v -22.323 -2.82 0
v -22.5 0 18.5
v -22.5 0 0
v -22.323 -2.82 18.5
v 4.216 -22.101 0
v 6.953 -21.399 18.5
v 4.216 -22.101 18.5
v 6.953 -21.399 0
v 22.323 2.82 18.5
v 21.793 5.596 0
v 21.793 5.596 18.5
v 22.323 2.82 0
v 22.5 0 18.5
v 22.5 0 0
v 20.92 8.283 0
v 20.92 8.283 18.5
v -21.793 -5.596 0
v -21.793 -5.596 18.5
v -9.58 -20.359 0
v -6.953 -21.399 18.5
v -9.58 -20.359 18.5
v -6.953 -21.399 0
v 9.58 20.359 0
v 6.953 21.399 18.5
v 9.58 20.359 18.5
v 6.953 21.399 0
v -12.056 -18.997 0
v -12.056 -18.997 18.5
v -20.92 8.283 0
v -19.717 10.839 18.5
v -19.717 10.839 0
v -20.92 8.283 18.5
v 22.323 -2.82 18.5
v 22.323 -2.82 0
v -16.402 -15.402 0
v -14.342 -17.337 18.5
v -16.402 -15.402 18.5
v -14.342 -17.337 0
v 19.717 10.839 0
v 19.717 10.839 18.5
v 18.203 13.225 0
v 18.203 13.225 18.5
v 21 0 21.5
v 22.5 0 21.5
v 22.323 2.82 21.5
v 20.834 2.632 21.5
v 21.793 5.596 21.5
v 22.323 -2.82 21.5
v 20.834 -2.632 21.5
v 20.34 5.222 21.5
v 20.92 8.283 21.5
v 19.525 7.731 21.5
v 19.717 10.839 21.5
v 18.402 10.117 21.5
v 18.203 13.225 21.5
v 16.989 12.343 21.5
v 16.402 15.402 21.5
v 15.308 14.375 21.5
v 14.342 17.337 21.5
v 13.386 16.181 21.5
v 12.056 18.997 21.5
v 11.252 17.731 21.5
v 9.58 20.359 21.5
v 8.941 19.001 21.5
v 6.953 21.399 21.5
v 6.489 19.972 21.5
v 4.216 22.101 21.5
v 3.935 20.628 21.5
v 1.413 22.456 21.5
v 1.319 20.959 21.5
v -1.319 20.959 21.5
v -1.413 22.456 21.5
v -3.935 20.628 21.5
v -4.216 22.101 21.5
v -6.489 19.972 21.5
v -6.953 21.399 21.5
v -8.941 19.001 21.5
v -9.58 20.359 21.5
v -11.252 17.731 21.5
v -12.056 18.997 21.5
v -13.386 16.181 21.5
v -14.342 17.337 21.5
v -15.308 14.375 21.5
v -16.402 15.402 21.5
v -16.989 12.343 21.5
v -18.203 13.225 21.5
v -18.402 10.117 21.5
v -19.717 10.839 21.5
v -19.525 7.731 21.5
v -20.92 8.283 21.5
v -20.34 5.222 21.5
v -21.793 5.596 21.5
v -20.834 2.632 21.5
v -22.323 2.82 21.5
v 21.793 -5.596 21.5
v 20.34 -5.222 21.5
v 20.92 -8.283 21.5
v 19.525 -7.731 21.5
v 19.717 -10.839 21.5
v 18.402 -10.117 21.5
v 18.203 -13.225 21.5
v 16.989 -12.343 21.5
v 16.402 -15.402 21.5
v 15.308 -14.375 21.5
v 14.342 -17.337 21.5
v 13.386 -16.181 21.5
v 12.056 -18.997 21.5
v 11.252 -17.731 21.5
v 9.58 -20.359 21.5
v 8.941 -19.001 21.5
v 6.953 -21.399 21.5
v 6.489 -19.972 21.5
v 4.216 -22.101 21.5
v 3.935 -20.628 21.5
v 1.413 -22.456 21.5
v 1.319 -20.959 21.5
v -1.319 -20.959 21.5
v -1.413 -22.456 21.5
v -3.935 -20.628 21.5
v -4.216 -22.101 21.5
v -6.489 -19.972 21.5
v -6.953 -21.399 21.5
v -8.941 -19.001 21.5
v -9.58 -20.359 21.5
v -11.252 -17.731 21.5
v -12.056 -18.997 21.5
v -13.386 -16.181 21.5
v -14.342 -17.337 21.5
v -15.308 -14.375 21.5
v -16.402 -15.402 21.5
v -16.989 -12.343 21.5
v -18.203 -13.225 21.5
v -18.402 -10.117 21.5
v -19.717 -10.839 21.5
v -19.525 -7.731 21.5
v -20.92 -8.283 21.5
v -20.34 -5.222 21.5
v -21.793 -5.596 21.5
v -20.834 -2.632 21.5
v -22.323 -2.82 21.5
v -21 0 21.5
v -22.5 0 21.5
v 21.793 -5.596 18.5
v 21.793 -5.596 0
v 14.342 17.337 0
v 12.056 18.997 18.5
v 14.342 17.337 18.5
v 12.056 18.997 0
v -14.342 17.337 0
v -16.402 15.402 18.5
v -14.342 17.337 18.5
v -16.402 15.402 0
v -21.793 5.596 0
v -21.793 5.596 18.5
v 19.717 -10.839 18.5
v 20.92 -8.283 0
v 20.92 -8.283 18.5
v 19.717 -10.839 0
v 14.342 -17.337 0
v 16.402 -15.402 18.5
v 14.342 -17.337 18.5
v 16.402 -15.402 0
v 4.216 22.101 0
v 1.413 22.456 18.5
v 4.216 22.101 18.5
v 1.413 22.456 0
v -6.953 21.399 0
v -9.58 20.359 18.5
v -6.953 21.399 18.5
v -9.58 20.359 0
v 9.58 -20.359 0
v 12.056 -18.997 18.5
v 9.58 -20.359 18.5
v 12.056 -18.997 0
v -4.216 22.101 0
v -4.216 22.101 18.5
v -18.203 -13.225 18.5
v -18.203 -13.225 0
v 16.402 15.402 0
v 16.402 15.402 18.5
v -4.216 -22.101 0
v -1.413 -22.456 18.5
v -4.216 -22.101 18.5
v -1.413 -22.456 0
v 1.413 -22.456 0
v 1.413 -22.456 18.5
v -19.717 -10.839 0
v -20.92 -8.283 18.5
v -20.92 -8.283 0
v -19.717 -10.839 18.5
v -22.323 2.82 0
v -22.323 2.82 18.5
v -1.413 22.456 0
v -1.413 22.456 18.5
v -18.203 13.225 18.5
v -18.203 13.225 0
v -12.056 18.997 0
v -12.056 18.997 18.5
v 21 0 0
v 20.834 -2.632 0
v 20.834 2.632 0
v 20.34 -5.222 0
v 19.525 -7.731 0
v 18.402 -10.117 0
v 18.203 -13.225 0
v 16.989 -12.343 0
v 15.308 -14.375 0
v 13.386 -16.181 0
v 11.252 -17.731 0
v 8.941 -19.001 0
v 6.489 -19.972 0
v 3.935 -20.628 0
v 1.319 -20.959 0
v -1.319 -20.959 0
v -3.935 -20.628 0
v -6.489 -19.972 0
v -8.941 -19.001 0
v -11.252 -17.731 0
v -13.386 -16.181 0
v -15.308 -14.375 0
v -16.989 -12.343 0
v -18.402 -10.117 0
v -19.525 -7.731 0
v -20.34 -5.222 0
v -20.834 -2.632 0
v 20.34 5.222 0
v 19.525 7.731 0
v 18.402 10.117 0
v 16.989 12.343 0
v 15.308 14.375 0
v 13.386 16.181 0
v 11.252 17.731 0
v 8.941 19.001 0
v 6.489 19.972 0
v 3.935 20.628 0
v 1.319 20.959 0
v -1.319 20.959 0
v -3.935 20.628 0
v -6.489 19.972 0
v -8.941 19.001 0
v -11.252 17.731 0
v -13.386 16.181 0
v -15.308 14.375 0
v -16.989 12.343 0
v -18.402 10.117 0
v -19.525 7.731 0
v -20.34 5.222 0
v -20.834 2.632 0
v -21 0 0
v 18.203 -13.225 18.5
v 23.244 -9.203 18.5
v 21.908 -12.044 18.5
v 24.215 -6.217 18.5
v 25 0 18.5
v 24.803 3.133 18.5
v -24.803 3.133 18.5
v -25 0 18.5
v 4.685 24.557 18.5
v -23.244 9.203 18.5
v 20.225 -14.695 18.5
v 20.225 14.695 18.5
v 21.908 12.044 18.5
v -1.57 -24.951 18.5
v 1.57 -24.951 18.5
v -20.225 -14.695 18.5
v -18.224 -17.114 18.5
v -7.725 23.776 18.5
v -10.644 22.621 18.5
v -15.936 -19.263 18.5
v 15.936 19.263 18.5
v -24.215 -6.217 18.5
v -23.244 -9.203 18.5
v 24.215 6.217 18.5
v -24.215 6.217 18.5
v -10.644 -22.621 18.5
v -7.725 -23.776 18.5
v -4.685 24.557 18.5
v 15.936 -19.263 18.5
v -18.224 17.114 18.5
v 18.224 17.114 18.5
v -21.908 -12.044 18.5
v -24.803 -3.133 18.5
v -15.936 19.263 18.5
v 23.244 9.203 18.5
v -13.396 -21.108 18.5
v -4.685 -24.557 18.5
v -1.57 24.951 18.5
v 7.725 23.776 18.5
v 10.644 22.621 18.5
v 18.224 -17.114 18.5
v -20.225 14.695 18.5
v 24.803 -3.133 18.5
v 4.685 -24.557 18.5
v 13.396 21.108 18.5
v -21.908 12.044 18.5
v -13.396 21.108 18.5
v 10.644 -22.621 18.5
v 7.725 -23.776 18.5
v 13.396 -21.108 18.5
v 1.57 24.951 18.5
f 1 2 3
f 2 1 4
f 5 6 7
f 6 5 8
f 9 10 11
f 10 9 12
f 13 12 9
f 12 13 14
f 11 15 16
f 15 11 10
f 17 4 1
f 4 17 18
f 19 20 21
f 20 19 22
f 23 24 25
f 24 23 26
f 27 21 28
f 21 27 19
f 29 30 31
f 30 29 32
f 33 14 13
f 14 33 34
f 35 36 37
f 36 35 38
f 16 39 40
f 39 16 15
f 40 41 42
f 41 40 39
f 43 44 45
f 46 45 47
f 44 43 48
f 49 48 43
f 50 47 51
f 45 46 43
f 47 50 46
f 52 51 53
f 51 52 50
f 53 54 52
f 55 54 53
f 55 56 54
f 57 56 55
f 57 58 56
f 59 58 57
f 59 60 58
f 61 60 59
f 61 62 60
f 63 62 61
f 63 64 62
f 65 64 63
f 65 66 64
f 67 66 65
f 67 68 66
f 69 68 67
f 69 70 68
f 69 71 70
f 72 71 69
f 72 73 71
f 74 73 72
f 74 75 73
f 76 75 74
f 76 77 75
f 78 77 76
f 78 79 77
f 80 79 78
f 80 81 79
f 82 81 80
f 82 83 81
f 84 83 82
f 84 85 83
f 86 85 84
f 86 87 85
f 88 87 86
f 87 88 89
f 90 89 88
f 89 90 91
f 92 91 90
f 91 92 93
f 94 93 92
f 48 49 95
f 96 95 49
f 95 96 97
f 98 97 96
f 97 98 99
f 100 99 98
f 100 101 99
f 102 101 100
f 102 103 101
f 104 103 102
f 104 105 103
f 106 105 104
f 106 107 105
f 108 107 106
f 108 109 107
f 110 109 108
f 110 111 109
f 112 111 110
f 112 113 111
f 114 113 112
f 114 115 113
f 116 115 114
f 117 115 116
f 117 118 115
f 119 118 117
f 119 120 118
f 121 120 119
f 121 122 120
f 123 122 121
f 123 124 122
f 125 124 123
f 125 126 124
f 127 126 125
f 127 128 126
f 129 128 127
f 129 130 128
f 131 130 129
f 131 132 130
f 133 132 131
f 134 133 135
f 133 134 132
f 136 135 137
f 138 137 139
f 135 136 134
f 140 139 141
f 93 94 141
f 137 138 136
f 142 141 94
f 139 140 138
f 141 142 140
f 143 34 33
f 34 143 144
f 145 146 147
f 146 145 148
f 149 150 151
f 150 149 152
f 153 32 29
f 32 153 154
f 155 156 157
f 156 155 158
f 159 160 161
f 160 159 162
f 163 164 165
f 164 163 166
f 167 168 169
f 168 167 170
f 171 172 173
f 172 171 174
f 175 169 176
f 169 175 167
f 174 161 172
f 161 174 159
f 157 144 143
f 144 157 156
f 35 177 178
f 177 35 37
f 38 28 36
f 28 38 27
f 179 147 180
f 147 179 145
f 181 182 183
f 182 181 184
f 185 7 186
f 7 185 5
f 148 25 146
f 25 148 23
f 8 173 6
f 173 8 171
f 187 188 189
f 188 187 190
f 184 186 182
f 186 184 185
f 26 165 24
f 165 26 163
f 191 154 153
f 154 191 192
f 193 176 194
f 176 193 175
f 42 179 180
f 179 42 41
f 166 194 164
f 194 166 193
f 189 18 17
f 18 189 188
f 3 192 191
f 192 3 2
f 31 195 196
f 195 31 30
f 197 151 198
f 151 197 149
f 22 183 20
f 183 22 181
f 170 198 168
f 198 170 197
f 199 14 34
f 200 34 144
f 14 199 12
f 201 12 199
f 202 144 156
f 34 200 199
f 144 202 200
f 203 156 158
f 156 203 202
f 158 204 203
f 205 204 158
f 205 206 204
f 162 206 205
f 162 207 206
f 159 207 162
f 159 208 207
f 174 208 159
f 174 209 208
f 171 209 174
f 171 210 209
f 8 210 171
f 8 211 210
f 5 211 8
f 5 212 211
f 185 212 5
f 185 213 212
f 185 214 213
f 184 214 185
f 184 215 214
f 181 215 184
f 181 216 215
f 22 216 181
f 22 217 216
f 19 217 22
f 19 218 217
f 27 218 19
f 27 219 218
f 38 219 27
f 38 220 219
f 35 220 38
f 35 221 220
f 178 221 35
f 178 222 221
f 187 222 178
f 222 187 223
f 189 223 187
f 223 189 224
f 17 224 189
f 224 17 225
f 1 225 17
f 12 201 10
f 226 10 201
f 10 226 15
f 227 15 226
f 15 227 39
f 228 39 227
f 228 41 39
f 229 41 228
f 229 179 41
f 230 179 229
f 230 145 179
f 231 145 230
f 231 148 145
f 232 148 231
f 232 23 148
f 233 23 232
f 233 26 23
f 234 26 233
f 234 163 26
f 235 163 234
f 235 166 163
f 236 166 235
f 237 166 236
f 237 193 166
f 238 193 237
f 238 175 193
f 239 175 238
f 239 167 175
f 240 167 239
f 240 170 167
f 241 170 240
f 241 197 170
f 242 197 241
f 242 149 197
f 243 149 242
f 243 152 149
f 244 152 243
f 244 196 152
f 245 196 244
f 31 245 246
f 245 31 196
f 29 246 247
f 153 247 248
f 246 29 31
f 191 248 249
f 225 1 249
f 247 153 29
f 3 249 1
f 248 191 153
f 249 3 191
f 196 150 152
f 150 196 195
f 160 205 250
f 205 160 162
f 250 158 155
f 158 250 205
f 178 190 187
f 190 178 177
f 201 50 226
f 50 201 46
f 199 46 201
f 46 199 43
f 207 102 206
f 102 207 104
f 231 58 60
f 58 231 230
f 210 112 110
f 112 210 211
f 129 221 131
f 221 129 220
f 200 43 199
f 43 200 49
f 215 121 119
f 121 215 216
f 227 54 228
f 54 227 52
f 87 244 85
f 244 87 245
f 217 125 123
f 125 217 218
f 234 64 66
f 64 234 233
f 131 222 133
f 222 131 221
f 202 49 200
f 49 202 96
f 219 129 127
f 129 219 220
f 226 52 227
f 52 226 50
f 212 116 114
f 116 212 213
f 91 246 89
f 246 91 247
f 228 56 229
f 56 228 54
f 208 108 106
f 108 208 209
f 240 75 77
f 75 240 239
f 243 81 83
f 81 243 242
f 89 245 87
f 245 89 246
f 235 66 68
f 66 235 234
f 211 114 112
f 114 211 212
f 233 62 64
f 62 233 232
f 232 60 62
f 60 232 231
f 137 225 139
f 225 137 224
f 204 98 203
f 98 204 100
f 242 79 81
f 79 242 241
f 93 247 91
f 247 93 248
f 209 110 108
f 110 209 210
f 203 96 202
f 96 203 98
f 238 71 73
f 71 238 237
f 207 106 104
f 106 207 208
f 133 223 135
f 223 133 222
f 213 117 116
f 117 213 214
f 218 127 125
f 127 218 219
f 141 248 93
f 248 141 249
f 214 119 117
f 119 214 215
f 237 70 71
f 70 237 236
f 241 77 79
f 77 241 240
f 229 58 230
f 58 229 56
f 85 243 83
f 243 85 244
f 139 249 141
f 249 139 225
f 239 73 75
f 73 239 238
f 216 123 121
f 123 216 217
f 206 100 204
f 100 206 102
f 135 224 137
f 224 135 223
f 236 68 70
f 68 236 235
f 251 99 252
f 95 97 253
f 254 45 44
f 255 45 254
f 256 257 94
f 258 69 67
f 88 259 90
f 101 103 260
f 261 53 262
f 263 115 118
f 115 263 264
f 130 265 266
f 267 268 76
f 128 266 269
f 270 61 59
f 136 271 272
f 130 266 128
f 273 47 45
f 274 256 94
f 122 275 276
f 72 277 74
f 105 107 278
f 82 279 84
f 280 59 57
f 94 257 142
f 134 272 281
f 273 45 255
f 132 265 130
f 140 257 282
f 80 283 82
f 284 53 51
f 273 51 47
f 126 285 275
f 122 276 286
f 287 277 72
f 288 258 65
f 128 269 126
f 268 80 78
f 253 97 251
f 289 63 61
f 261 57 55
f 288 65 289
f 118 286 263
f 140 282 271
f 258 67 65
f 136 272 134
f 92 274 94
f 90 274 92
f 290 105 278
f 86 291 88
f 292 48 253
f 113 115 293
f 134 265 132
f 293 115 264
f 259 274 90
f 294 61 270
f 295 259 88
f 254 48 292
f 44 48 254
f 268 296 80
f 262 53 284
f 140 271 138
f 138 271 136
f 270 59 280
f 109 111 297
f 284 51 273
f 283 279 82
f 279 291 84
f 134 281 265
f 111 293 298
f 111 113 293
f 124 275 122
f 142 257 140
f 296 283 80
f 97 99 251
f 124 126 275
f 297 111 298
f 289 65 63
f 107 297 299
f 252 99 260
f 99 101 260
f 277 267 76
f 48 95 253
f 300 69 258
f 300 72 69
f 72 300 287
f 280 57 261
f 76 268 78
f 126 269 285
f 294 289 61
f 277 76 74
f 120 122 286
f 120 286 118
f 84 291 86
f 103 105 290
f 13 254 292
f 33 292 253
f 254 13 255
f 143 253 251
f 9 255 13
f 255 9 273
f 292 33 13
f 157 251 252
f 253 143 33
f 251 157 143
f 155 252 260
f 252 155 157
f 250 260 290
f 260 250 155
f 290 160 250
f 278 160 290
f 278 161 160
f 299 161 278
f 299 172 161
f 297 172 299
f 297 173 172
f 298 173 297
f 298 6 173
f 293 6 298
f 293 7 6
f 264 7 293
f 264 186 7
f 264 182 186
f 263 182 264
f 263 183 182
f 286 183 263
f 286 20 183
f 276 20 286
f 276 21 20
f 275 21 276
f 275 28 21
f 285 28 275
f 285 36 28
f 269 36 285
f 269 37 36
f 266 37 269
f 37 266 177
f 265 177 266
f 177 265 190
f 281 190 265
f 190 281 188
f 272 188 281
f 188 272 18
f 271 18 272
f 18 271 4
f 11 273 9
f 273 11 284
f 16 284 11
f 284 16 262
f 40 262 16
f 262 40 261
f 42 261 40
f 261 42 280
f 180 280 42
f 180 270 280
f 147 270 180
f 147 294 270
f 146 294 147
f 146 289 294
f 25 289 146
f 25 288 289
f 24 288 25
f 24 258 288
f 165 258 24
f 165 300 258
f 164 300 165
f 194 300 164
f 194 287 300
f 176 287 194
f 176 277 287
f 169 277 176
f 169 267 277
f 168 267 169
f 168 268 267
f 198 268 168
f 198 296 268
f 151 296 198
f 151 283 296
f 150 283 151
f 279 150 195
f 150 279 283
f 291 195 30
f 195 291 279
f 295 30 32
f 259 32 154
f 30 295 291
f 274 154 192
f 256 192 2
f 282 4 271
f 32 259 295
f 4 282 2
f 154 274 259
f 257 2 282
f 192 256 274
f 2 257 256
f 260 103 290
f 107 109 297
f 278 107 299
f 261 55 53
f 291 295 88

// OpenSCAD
/*
Author: Kevin Lutzer
Date Created: Oct 8 2016 
Description: A part to protect a whole in a desk meant for threading cables through.
*/

///////////////////////////////////////////////// Parameter /////////////////////////////////////////////////

wall_thickness = 3;
hole_diameter = 45; 

cover_height = 3; 
cover_thickness = 5;
hole_height = 18.5;

///////////////////////////////////////////////// Prototypes /////////////////////////////////////////////////
union()
{
    difference(){
        cylinder(hole_height + cover_height, d1 = hole_diameter, d2 = hole_diameter, 0, $fn=50 );
        cylinder(hole_height + cover_height, d1 = (hole_diameter-wall_thickness), d2 = (hole_diameter-wall_thickness), 0, $fn=50);
    }
    translate([0,0,hole_height]){
        difference(){
            cylinder(cover_height, d1 = (hole_diameter+cover_thickness), d2 = (hole_diameter), 0, $fn=50);
            cylinder(cover_height, d1 = hole_diameter, d2 = hole_diameter, 0, $fn=50);    
        }
        
    }
}
////////////////////////////////////////////////// modules //////////////////////////////////////////////////
